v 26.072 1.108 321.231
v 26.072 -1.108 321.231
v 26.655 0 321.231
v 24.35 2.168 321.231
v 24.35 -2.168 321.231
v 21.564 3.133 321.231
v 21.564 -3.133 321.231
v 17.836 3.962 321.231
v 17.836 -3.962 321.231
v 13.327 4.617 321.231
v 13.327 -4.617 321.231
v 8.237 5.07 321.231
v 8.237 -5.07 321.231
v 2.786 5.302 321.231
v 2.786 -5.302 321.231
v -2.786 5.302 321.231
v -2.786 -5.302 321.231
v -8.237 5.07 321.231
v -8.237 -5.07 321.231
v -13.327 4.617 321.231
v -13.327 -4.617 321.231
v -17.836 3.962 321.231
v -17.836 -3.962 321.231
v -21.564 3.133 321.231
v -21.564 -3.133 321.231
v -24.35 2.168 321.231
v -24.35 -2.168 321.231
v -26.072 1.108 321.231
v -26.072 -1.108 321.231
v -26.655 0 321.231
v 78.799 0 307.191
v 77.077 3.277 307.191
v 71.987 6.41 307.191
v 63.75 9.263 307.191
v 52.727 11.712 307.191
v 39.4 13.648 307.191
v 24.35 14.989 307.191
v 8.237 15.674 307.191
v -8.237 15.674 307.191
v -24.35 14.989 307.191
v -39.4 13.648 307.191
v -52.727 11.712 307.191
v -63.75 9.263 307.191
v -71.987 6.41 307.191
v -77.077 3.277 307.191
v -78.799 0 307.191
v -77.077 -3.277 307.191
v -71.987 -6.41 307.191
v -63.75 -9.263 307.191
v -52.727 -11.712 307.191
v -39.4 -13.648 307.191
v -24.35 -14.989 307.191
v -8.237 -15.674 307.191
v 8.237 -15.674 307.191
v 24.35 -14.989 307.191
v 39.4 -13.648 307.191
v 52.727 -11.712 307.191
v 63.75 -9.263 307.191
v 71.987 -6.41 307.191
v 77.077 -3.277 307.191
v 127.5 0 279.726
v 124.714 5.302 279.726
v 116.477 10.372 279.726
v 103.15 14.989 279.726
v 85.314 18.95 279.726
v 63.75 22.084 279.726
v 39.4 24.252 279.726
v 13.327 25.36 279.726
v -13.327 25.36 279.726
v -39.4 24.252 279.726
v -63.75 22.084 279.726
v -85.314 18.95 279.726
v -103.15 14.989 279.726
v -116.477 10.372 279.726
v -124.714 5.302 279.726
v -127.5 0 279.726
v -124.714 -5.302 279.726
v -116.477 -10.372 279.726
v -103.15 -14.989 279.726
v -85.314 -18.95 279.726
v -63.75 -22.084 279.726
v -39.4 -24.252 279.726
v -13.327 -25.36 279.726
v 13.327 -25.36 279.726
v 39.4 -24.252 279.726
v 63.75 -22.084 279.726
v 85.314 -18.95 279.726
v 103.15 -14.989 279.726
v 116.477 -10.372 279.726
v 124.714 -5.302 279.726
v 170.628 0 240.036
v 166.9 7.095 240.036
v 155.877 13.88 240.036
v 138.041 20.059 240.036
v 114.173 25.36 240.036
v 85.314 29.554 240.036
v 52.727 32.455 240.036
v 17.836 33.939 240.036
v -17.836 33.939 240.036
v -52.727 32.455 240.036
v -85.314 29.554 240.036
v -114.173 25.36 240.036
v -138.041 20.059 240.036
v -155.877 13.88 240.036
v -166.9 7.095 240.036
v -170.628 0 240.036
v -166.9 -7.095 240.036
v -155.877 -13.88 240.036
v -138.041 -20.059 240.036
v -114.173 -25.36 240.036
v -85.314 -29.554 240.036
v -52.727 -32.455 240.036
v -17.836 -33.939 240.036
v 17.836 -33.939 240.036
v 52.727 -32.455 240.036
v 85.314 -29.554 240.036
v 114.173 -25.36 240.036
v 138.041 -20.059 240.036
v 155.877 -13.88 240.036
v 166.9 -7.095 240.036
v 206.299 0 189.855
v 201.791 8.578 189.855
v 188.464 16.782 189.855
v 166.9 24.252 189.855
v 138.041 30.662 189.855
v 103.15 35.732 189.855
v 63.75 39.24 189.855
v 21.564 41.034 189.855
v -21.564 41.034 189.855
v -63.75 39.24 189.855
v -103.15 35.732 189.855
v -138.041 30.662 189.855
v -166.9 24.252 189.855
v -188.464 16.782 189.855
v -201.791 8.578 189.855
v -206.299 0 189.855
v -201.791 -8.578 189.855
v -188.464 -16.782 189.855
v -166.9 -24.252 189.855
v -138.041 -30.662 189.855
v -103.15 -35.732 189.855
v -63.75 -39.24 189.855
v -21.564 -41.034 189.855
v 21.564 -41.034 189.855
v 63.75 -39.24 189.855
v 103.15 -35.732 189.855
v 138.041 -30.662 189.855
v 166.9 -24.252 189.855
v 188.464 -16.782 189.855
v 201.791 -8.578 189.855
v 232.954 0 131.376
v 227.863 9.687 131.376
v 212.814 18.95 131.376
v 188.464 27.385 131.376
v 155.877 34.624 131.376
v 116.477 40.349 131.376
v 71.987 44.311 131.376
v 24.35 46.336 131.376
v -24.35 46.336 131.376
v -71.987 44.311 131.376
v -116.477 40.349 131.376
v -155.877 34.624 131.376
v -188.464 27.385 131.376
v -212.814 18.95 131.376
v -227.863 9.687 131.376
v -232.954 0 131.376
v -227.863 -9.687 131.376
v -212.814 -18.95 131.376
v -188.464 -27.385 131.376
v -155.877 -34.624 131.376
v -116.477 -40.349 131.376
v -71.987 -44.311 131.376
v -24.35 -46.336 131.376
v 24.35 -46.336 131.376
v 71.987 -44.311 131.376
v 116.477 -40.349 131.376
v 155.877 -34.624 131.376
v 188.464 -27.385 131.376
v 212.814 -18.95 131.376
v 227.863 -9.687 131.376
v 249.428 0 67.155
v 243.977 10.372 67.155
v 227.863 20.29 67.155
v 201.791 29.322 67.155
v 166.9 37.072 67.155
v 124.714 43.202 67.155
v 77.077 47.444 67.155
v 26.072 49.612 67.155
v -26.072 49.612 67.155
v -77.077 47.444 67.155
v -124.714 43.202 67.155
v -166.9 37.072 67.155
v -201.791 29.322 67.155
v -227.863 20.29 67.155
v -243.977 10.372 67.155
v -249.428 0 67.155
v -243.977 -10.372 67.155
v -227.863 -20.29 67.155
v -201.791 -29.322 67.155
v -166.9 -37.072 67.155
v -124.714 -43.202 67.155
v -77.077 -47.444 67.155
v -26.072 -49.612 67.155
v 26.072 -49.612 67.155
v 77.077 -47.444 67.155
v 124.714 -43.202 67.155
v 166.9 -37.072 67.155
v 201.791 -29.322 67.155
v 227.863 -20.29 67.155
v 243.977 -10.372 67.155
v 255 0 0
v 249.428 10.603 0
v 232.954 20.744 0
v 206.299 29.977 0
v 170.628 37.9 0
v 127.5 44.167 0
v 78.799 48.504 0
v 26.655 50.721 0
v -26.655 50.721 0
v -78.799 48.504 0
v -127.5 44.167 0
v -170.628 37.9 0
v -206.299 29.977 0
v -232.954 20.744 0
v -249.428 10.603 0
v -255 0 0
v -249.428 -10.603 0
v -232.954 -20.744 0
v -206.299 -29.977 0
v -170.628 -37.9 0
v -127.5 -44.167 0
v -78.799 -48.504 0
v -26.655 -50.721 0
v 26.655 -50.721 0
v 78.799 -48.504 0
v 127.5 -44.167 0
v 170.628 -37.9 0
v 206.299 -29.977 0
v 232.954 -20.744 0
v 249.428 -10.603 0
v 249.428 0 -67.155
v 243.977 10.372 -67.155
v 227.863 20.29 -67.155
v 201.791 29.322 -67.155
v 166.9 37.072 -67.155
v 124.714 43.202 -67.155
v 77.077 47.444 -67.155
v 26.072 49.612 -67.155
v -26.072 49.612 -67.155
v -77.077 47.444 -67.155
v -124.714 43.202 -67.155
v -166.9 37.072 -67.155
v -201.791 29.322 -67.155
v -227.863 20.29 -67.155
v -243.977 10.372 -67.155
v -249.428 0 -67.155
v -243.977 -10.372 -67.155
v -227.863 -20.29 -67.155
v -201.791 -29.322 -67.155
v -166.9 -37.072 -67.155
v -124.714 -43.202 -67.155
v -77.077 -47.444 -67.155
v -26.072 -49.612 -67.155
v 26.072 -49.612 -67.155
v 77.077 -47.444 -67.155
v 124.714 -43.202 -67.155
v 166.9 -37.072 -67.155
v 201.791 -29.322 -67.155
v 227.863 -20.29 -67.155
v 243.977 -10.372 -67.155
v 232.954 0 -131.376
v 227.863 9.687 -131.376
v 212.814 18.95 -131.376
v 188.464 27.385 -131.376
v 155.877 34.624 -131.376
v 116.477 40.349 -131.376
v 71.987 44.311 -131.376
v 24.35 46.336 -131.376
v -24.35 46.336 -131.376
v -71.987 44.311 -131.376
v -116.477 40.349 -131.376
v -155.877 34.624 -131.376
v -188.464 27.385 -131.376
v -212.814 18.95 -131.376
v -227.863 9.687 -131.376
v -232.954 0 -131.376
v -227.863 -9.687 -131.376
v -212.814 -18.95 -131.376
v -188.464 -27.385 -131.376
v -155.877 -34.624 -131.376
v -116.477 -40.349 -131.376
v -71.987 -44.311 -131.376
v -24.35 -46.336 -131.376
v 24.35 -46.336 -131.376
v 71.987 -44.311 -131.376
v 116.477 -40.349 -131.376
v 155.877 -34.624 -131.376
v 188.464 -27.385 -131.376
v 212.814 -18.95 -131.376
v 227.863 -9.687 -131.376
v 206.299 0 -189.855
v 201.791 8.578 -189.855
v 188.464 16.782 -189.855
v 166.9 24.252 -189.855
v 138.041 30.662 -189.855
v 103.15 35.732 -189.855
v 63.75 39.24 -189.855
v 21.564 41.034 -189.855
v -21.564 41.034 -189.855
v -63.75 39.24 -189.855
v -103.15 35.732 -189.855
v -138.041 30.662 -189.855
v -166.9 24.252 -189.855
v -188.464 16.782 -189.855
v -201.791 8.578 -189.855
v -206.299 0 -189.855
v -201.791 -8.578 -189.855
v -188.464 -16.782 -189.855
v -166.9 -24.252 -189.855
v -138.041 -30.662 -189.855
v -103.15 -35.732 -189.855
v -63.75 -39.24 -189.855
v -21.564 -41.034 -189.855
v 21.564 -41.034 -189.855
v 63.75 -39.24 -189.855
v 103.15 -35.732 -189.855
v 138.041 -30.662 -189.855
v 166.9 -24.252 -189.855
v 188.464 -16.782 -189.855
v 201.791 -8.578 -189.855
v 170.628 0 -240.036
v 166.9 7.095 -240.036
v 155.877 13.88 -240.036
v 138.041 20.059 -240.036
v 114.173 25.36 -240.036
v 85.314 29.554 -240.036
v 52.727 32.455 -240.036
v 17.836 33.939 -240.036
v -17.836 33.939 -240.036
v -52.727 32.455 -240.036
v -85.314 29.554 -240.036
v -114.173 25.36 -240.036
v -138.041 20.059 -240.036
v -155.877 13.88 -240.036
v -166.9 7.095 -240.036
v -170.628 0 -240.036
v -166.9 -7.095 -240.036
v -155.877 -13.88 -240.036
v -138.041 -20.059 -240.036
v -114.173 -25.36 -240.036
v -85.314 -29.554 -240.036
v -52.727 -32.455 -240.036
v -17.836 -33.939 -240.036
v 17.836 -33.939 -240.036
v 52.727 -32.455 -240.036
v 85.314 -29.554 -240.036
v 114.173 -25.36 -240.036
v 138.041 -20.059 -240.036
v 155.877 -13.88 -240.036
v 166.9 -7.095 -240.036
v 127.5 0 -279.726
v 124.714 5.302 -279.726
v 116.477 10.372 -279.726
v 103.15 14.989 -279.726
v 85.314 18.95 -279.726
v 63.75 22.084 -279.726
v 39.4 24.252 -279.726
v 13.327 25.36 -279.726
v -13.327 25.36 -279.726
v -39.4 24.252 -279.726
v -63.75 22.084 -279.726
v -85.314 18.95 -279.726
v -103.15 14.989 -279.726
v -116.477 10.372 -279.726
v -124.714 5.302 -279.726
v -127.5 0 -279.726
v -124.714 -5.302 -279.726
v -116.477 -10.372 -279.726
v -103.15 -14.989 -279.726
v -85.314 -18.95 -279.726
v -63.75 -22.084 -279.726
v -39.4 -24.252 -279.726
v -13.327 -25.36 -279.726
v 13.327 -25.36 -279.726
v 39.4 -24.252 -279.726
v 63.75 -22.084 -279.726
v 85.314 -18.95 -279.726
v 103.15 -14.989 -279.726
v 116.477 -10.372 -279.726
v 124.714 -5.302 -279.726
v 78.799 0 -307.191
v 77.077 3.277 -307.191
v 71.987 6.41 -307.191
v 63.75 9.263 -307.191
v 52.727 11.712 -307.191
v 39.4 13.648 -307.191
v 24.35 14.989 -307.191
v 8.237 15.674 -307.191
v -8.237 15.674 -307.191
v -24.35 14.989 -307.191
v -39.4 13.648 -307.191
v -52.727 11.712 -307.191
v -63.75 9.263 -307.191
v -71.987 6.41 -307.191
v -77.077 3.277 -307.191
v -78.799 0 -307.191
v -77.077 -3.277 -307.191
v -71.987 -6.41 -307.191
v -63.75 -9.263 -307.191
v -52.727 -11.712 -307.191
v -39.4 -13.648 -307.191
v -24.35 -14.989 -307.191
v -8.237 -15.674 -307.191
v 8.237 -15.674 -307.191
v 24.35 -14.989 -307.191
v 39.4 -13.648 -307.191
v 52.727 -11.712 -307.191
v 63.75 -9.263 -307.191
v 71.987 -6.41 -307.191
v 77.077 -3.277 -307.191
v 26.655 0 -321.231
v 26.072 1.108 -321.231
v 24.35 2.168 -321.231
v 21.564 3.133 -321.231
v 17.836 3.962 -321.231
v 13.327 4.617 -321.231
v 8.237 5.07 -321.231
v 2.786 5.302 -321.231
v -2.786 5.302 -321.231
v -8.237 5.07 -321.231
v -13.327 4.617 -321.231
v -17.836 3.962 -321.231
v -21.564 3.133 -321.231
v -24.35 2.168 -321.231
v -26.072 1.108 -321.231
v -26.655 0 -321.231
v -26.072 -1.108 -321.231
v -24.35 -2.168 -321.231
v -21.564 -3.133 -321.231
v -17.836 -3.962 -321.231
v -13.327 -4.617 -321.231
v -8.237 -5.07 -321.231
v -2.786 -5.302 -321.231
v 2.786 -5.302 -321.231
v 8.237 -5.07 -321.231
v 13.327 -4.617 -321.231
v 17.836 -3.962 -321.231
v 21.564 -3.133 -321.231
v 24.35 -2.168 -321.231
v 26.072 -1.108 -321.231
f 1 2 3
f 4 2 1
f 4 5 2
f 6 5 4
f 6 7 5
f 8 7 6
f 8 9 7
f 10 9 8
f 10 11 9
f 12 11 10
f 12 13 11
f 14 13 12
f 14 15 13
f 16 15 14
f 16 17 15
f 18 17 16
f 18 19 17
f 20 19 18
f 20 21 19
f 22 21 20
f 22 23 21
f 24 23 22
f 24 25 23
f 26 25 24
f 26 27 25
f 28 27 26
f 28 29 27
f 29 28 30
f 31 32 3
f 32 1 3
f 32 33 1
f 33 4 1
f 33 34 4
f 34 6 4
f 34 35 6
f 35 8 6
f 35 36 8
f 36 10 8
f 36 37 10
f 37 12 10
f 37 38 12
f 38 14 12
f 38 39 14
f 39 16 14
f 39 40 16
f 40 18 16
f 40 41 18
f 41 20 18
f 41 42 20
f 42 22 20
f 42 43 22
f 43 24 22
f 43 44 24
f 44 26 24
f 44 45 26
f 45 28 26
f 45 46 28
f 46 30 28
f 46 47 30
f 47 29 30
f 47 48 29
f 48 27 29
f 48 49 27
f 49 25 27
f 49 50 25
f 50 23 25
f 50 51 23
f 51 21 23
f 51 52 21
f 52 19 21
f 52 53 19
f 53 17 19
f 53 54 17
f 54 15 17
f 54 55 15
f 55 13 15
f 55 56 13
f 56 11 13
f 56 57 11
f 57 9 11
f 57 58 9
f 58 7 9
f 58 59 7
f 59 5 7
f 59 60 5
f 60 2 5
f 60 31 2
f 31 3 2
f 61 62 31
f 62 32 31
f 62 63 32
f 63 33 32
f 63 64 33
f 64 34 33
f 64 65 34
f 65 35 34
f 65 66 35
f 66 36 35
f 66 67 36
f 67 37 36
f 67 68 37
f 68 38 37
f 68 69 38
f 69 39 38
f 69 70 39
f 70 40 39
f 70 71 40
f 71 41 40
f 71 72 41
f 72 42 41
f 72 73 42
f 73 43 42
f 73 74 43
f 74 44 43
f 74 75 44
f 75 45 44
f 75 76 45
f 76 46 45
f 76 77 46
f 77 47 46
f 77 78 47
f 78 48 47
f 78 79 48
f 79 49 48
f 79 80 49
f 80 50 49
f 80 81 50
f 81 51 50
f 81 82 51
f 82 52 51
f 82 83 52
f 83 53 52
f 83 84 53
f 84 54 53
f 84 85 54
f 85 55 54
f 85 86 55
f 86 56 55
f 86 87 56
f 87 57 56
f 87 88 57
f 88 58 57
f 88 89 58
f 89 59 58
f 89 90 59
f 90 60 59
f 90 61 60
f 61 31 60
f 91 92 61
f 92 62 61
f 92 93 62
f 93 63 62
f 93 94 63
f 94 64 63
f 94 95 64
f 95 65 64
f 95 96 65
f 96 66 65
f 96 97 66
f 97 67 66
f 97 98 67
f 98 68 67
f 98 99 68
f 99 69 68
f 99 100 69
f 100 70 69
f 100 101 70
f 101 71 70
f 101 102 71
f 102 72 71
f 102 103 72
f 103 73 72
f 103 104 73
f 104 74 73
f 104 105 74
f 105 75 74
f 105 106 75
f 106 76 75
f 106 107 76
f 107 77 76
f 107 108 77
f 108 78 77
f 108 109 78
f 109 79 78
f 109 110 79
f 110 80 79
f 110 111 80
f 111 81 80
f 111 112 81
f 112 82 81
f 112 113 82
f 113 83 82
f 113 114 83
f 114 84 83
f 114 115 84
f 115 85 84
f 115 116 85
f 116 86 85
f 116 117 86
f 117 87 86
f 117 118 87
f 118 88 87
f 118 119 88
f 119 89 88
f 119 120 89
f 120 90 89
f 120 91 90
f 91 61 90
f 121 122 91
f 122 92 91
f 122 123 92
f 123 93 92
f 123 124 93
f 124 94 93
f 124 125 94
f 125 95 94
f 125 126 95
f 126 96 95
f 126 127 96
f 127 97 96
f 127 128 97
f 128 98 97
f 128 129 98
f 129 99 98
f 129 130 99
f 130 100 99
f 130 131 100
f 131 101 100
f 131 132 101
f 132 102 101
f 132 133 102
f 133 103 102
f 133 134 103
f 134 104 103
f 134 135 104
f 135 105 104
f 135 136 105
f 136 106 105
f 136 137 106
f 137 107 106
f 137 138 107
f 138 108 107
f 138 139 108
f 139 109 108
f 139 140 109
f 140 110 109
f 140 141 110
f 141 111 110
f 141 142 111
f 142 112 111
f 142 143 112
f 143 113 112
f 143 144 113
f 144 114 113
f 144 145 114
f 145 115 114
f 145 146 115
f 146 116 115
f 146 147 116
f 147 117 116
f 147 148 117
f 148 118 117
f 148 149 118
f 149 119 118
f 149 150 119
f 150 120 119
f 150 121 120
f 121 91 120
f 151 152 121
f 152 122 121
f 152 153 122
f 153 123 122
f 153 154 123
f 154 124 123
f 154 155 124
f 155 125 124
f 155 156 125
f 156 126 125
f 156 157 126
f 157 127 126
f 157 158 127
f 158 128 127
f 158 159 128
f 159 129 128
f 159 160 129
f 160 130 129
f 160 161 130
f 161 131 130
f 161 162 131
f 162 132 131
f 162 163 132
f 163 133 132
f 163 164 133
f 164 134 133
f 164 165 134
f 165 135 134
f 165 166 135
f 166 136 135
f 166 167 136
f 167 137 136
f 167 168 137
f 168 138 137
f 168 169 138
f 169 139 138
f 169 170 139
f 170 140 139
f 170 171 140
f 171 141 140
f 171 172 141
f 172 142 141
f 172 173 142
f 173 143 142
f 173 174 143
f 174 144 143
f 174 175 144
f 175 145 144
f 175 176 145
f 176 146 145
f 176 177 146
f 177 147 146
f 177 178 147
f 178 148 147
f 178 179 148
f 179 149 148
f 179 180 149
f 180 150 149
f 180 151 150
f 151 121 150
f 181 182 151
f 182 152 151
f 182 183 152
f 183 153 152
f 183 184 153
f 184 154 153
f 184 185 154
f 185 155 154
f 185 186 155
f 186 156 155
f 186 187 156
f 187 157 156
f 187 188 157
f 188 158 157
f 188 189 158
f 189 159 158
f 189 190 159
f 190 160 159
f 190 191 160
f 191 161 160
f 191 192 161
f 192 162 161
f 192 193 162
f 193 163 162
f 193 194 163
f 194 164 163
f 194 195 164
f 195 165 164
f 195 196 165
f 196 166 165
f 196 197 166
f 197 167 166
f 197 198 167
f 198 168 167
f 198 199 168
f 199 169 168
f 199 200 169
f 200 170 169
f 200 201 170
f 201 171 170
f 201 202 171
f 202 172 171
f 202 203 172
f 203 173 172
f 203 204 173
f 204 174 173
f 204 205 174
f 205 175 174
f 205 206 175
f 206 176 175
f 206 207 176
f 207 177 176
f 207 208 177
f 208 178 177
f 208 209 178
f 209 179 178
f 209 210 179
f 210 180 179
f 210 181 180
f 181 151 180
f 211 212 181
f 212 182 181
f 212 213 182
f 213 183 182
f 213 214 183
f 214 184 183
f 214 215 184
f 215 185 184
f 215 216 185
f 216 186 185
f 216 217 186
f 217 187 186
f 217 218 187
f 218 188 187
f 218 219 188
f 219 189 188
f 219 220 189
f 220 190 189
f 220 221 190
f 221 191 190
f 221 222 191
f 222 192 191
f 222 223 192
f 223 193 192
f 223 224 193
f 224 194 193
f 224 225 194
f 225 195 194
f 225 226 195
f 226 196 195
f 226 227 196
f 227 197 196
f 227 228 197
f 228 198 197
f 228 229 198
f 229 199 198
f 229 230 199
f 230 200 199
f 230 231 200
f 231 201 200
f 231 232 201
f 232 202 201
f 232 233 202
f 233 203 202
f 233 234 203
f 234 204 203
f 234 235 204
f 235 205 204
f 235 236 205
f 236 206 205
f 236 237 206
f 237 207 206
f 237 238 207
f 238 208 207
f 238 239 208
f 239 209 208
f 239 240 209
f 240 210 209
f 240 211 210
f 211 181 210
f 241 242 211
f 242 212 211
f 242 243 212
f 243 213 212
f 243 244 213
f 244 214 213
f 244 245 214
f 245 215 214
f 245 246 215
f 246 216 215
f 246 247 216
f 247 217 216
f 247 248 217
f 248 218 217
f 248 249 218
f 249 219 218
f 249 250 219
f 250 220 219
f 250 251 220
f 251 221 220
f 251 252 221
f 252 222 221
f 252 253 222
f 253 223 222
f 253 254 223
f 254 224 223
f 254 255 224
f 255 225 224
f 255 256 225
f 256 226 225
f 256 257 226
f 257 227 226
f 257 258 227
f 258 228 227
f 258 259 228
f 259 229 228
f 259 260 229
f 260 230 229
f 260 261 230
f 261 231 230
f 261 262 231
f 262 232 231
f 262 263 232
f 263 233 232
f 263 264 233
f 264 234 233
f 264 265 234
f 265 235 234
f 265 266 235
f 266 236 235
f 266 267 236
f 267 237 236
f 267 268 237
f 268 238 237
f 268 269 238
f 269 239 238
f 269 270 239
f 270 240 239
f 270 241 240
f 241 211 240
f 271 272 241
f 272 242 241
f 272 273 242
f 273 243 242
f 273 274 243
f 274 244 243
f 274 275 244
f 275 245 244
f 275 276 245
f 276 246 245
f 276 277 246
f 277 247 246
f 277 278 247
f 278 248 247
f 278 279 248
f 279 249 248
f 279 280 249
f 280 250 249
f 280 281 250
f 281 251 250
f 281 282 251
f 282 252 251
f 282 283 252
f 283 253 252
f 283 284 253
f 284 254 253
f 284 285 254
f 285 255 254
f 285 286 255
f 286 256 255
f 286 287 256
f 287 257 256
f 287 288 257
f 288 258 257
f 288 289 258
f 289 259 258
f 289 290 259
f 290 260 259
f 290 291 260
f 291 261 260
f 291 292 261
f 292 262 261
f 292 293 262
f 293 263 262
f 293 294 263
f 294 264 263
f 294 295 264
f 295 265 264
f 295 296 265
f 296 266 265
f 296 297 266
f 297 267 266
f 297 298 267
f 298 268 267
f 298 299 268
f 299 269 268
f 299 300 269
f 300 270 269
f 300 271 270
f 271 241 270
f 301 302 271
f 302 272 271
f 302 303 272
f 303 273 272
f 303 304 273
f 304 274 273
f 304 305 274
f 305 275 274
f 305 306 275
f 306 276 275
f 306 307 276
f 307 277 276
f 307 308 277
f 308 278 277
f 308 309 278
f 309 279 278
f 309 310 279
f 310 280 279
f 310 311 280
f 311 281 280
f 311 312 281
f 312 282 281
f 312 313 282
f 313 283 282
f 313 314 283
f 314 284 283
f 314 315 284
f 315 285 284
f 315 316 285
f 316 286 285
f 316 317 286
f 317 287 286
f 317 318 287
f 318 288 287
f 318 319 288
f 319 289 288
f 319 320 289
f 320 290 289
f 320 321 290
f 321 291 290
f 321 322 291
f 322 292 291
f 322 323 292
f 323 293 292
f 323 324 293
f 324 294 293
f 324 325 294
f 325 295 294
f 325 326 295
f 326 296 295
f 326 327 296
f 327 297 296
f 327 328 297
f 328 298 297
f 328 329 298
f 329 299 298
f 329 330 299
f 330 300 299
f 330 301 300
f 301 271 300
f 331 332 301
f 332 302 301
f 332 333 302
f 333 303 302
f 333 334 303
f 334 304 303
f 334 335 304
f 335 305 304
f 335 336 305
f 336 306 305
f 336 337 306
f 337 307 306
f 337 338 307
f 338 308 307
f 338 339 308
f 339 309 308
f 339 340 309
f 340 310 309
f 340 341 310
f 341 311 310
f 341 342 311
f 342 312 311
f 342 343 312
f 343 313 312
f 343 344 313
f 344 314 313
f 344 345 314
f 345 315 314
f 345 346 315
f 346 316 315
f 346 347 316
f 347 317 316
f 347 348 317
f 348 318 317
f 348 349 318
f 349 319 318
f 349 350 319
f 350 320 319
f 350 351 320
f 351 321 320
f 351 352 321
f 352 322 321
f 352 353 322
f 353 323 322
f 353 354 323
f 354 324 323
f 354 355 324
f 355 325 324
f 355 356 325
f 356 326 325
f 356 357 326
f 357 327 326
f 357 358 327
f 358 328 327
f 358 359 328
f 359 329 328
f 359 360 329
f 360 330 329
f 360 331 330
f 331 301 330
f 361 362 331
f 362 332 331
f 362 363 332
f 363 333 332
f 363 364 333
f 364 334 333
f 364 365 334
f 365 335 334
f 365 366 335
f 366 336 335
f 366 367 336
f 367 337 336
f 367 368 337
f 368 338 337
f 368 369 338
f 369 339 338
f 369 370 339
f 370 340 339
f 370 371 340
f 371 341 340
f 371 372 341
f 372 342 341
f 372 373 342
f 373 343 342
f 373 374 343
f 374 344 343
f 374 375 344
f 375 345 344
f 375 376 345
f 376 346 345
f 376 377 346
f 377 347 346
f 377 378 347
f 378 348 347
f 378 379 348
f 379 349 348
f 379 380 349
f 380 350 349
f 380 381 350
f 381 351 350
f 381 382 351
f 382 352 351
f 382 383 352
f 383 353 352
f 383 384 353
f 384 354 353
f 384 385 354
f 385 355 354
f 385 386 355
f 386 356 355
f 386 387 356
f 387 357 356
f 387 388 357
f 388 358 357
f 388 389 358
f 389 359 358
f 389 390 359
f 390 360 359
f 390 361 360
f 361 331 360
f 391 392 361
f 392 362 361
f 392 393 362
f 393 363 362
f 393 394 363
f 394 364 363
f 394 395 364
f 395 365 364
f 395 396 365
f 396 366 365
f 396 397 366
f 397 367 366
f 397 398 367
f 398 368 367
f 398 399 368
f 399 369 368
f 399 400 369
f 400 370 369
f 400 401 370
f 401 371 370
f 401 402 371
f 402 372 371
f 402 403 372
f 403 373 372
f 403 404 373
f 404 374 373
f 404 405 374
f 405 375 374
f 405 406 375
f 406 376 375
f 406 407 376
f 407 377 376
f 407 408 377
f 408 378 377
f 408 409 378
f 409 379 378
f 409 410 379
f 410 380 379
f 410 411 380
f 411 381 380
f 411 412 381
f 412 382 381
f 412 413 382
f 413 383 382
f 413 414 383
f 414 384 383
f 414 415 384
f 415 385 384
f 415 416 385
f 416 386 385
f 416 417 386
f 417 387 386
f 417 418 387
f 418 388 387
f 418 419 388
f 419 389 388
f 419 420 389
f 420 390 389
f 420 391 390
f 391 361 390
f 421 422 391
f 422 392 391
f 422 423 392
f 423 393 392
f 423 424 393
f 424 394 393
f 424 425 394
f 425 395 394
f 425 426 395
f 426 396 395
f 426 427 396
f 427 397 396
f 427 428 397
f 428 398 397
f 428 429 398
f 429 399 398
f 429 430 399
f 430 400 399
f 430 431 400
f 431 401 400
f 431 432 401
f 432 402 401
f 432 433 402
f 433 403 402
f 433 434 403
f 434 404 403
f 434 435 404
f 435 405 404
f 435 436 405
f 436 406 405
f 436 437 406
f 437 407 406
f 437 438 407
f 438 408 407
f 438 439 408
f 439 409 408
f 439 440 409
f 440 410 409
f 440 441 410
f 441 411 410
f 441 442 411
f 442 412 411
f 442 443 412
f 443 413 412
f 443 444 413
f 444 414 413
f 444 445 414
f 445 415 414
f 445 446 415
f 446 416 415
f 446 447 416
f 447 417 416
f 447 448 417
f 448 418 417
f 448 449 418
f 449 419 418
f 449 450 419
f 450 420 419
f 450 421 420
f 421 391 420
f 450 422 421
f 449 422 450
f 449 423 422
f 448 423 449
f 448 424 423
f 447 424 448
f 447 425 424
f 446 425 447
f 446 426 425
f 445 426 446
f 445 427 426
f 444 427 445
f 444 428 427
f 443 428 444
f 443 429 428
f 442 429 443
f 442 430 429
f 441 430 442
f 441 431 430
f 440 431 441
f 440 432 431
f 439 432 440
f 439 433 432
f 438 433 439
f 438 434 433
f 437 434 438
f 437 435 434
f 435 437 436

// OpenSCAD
// Generated by SolidPython 1.0.1 on 2020-07-29 00:46:51


scale(v = [15, 3, 19]) {
	sphere(r = 17);
}
/***********************************************
*********      SolidPython code:      **********
************************************************
 
# import packages: SolidPython
from solid import *
from solid.utils import *
from itertools import chain, combinations, permutations


class Resize:

    def __init__(self, scad_file):
        self.scad_file = scad_file
        #self.scad_file = import_scad(scad_file)
        # cone/cylinder param:
        self.r1 = 0
        self.r2 = 0
        self.h = 0
        # rectangular prism param:
        self.w = 0
        self.l = 0
        # ellipse param:
        self.r = 0

    # import OpenScad code (file name corresponds to shape)


    # classify shape + parameters
    def assign(self, param1, param2, param3):
        if self.scad_file == 'cone.scad':
            self.r1 = param1
            self.r2 = param2
            self.h = param3
        elif self.scad_file == 'cylinder.scad':
            self.r1 = param1
            self.r2 = param2
            self.h = param3
        elif self.scad_file == 'rectangularPrism.scad':
            self.h = param1
            self.l = param2
            self.w = param3
        else:
            self.r = param1
            self.h = param2

    # resize parameters
    def iterate(self):
        x = range(3, 20, 2)
        i = 1
        if self.scad_file == 'cone.scad':
            tempList = list(permutations(x, 2))
            for temp in tempList:
                param1 = temp[0]
                param2 = temp[1]
                filepath = 'produced_scad_files/' + 'cone' + str(param1) + '_' + str(param2) + '_' + '.scad'
                scad_render_to_file(cylinder(h=param1, r1=param2, r2=0), filepath)

        elif self.scad_file == 'cylinder.scad':
            tempList = list(permutations(x, 3))
            for temp in tempList:
                param1 = temp[0]
                param2 = temp[1]
                filepath = 'produced_scad_files/' + 'cylinder' + str(param1) + '_' + str(param2) + '_' + '.scad'
                scad_render_to_file(cylinder(h=param1, r1=param2, r2=param2), filepath)

        elif self.scad_file == 'rectangularPrism.scad':
            tempList = list(permutations(x, 3))
            for temp in tempList:
                param1 = temp[0]
                param2 = temp[1]
                param3 = temp[2]
                filepath = 'produced_scad_files/' + 'rectangularPrism' + str(param1) + '_' + str(param2) + '_' + str(
                    param3) + '.scad'
                scad_render_to_file(cube(size=(param1, param2, param3)), filepath)

        elif self.scad_file == 'ellipse.scad':
            tempList = list(permutations(x, 4))
            for temp in tempList:
                param1 = temp[0]
                param2 = temp[1]
                param3 = temp[2]
                param4 = temp[3]
                filepath = 'produced_scad_files/' + 'ellipse' + str(param1) + '_' + str(param2) + '_' + str(param3) + '_' + str(param4) + '.scad'
                scad_render_to_file(scale([param1, param2, param3])(sphere(r=param4)), filepath)

    def render_to_scadfile(self):
        scad_render_to_file(scad, 'example.scad') 
 
************************************************/
